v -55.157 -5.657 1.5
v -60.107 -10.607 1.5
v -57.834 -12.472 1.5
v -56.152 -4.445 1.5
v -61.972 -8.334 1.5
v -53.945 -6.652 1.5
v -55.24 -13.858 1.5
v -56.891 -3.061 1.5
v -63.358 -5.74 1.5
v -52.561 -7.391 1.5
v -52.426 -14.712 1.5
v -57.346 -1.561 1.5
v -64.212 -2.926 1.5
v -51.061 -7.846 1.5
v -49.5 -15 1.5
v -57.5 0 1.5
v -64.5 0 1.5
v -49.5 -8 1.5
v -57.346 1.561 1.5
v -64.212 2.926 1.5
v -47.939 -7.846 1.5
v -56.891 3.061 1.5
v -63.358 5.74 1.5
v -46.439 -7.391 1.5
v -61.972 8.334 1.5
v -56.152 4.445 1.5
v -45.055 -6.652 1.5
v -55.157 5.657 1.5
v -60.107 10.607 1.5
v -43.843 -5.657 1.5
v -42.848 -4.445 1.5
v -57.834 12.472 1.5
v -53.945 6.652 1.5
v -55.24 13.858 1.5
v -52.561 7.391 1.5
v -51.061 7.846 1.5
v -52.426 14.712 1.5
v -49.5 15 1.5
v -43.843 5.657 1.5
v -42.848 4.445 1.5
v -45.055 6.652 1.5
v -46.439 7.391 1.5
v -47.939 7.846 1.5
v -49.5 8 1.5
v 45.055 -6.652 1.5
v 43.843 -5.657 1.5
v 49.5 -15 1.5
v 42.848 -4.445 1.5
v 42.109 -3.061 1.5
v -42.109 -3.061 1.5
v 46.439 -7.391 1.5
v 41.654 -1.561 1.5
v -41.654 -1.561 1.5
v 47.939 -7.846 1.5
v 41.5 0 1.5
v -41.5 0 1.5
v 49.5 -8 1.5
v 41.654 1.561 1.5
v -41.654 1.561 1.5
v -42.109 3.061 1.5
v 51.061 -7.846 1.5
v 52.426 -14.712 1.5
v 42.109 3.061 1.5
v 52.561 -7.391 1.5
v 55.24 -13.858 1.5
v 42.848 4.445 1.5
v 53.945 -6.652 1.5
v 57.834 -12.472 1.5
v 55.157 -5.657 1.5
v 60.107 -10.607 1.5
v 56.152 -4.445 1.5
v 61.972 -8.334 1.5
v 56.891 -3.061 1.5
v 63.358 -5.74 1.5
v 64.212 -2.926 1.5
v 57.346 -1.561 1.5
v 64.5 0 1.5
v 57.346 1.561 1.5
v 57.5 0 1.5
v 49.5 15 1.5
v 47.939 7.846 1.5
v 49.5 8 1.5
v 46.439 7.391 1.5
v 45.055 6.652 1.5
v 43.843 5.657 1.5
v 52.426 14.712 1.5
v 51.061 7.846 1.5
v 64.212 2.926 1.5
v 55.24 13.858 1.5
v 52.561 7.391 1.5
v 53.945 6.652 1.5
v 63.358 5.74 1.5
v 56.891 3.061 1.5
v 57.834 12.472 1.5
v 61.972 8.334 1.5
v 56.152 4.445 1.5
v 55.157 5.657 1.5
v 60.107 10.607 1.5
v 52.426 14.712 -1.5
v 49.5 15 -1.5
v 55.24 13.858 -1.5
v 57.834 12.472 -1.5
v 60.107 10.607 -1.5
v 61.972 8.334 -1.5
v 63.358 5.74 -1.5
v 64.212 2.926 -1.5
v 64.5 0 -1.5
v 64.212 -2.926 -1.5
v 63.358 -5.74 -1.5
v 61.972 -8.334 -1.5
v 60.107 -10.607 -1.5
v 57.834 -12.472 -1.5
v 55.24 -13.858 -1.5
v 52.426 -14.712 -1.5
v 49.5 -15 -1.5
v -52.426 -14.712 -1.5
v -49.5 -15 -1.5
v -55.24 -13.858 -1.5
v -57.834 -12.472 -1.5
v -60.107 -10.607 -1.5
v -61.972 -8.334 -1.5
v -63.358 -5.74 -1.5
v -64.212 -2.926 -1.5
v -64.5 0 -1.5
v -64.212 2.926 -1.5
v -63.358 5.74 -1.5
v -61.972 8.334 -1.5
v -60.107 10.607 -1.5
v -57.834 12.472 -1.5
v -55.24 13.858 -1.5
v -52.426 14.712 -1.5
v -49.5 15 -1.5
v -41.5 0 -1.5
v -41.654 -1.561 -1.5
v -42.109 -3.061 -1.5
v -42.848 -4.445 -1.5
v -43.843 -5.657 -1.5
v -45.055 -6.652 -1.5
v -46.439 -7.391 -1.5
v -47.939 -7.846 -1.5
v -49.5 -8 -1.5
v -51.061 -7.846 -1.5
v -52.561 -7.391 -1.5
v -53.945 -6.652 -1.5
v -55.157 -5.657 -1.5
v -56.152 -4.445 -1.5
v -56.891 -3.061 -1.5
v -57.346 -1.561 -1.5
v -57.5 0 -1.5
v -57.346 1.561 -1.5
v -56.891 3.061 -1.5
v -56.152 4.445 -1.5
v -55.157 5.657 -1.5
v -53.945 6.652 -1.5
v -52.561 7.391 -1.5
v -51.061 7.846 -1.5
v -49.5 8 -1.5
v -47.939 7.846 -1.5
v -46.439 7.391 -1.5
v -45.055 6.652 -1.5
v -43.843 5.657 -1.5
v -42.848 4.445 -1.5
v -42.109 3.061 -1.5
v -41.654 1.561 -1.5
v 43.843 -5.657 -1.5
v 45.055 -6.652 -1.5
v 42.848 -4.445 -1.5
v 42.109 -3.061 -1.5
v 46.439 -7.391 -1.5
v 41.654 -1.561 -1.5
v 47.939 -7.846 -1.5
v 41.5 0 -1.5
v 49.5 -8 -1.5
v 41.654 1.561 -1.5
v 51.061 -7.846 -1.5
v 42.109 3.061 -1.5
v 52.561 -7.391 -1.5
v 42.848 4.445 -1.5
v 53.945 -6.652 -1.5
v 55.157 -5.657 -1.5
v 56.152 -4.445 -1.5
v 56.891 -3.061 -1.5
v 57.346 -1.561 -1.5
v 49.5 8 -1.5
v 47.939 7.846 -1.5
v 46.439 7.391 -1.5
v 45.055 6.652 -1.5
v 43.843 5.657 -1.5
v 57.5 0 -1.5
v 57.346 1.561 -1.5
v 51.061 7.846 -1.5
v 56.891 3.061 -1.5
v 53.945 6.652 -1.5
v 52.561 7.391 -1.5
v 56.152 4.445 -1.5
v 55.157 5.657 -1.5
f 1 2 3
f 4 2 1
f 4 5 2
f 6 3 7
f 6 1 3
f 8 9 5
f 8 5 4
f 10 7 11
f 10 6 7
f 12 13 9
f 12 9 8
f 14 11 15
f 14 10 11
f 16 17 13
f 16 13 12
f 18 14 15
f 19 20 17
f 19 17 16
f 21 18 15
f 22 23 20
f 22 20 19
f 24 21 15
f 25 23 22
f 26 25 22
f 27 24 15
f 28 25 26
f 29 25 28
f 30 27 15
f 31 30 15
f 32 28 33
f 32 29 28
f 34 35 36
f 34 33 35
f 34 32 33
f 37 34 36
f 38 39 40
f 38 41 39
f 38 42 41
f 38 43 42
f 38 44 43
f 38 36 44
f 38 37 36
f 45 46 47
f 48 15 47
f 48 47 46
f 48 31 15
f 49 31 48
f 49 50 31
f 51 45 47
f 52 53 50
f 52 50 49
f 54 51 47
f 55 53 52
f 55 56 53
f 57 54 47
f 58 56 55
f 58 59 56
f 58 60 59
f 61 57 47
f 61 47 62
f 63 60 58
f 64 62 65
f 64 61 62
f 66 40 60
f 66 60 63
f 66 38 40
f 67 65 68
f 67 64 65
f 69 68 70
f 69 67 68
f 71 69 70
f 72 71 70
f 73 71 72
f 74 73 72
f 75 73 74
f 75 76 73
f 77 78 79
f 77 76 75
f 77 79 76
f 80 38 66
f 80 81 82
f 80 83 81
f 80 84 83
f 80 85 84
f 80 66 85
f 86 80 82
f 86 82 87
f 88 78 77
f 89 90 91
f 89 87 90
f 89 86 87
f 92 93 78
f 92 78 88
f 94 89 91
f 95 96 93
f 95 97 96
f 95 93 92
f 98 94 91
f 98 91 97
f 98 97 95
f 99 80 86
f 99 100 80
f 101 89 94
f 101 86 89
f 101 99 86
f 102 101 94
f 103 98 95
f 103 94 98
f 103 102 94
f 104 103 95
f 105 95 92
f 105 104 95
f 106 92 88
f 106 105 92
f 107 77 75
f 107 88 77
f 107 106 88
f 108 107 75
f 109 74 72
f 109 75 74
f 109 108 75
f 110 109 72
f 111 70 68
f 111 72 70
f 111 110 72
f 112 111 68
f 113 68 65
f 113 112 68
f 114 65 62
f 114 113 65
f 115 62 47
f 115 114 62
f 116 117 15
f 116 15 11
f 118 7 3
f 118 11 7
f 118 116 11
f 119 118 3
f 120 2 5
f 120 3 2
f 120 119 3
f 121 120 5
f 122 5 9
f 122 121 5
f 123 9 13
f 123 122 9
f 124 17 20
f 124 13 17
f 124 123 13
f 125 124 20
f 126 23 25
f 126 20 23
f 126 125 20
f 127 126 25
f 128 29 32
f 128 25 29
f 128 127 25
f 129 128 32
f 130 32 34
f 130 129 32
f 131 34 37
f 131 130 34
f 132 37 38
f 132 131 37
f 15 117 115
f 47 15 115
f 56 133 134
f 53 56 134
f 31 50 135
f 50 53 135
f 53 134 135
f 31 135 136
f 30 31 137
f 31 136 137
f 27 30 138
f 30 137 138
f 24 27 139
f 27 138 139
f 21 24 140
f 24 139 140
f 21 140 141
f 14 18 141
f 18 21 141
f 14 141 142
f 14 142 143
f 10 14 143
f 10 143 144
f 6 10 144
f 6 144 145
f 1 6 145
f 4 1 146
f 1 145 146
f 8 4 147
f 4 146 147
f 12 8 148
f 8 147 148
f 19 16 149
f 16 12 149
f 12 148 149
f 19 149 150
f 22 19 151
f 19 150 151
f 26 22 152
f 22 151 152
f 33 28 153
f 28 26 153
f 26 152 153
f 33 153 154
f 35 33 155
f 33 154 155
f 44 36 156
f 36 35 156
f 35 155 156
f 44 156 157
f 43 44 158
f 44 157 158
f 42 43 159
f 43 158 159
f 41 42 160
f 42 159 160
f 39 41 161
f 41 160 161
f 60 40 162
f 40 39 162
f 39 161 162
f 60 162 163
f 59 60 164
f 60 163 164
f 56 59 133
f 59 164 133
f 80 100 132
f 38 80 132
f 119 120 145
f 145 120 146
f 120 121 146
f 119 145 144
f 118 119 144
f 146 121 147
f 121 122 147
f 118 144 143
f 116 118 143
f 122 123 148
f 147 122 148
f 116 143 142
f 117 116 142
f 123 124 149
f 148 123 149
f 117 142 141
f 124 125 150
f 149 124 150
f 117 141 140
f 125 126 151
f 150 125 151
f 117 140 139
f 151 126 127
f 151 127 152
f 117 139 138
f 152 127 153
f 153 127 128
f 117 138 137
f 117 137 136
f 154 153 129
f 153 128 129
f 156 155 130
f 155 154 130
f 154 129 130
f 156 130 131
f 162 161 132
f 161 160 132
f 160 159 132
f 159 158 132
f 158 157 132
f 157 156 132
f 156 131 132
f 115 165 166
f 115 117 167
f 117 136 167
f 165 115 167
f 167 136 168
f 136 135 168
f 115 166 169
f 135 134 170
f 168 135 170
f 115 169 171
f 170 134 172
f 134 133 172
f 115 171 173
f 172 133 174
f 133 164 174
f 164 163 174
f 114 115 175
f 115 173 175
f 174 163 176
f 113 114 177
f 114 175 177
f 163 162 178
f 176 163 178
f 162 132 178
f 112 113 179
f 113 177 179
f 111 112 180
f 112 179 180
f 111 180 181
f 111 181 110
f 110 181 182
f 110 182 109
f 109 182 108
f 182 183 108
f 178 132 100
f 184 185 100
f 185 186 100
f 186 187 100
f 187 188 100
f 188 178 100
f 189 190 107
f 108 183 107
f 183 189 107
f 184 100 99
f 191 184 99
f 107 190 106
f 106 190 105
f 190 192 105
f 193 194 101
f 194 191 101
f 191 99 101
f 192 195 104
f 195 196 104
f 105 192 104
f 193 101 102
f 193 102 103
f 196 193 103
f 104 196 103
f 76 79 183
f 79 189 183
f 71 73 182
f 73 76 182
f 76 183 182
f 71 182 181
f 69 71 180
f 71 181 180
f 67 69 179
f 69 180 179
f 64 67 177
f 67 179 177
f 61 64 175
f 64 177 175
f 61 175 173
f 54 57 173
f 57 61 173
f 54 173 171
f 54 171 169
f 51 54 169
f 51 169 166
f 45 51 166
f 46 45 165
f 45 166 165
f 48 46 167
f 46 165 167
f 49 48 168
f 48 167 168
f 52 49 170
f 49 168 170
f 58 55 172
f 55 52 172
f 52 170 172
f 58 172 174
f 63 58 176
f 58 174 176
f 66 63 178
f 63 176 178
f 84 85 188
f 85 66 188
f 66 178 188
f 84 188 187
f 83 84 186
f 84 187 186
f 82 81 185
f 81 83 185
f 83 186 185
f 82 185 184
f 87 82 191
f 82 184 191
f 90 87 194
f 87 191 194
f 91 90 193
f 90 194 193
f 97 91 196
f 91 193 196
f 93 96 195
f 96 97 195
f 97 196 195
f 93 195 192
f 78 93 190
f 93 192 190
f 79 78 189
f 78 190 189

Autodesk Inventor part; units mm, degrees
ref_plane "YZ Plane" through (0, 0, 0) normal (1, 0, 0) x (0, 1, 0)
ref_plane "XZ Plane" through (0, 0, 0) normal (0, 1, 0) x (-1, 0, 0)
ref_plane "XY Plane" through (0, 0, 0) normal (0, 0, 1) x (1, 0, 0)
sketch "Esboço1" plane through (0, 0, 0) normal (0, 0, 1) x (1, 0, 0)
  line L0 (-49.5, 0) -> (49.5, 0) construction
  line L1 (-49.5, -15) -> (49.5, -15)
  line L2 (49.5, 15) -> (-49.5, 15)
  arc A0 (-49.5, 15) -> (-49.5, -15) centre (-49.5, 0) ccw
  arc A1 (49.5, -15) -> (49.5, 15) centre (49.5, 0) ccw
  circle A2 centre (-49.5, 0) radius 8
  circle A3 centre (49.5, 0) radius 8
  point P0 (0, 0)
  dimension "d0" = 16
  dimension "d1" = 99
  dimension "d4" = 30
extrude "Extrusão1" add sketch "Esboço1" along normal mid plane 3
sketch "Esboço2" plane through (0, 0, 1.5) normal (0, 0, 1) x (1, 0, 0)
  circle A0 centre (-49.5, 0) radius 8 projected
  circle A1 centre (49.5, 0) radius 8 projected
  line L0 (-49.5, 0) -> (49.5, 0)
  line L1 (0, 0) -> (0, -34.993)
properties part number "Chapa - Aperto fixação"
